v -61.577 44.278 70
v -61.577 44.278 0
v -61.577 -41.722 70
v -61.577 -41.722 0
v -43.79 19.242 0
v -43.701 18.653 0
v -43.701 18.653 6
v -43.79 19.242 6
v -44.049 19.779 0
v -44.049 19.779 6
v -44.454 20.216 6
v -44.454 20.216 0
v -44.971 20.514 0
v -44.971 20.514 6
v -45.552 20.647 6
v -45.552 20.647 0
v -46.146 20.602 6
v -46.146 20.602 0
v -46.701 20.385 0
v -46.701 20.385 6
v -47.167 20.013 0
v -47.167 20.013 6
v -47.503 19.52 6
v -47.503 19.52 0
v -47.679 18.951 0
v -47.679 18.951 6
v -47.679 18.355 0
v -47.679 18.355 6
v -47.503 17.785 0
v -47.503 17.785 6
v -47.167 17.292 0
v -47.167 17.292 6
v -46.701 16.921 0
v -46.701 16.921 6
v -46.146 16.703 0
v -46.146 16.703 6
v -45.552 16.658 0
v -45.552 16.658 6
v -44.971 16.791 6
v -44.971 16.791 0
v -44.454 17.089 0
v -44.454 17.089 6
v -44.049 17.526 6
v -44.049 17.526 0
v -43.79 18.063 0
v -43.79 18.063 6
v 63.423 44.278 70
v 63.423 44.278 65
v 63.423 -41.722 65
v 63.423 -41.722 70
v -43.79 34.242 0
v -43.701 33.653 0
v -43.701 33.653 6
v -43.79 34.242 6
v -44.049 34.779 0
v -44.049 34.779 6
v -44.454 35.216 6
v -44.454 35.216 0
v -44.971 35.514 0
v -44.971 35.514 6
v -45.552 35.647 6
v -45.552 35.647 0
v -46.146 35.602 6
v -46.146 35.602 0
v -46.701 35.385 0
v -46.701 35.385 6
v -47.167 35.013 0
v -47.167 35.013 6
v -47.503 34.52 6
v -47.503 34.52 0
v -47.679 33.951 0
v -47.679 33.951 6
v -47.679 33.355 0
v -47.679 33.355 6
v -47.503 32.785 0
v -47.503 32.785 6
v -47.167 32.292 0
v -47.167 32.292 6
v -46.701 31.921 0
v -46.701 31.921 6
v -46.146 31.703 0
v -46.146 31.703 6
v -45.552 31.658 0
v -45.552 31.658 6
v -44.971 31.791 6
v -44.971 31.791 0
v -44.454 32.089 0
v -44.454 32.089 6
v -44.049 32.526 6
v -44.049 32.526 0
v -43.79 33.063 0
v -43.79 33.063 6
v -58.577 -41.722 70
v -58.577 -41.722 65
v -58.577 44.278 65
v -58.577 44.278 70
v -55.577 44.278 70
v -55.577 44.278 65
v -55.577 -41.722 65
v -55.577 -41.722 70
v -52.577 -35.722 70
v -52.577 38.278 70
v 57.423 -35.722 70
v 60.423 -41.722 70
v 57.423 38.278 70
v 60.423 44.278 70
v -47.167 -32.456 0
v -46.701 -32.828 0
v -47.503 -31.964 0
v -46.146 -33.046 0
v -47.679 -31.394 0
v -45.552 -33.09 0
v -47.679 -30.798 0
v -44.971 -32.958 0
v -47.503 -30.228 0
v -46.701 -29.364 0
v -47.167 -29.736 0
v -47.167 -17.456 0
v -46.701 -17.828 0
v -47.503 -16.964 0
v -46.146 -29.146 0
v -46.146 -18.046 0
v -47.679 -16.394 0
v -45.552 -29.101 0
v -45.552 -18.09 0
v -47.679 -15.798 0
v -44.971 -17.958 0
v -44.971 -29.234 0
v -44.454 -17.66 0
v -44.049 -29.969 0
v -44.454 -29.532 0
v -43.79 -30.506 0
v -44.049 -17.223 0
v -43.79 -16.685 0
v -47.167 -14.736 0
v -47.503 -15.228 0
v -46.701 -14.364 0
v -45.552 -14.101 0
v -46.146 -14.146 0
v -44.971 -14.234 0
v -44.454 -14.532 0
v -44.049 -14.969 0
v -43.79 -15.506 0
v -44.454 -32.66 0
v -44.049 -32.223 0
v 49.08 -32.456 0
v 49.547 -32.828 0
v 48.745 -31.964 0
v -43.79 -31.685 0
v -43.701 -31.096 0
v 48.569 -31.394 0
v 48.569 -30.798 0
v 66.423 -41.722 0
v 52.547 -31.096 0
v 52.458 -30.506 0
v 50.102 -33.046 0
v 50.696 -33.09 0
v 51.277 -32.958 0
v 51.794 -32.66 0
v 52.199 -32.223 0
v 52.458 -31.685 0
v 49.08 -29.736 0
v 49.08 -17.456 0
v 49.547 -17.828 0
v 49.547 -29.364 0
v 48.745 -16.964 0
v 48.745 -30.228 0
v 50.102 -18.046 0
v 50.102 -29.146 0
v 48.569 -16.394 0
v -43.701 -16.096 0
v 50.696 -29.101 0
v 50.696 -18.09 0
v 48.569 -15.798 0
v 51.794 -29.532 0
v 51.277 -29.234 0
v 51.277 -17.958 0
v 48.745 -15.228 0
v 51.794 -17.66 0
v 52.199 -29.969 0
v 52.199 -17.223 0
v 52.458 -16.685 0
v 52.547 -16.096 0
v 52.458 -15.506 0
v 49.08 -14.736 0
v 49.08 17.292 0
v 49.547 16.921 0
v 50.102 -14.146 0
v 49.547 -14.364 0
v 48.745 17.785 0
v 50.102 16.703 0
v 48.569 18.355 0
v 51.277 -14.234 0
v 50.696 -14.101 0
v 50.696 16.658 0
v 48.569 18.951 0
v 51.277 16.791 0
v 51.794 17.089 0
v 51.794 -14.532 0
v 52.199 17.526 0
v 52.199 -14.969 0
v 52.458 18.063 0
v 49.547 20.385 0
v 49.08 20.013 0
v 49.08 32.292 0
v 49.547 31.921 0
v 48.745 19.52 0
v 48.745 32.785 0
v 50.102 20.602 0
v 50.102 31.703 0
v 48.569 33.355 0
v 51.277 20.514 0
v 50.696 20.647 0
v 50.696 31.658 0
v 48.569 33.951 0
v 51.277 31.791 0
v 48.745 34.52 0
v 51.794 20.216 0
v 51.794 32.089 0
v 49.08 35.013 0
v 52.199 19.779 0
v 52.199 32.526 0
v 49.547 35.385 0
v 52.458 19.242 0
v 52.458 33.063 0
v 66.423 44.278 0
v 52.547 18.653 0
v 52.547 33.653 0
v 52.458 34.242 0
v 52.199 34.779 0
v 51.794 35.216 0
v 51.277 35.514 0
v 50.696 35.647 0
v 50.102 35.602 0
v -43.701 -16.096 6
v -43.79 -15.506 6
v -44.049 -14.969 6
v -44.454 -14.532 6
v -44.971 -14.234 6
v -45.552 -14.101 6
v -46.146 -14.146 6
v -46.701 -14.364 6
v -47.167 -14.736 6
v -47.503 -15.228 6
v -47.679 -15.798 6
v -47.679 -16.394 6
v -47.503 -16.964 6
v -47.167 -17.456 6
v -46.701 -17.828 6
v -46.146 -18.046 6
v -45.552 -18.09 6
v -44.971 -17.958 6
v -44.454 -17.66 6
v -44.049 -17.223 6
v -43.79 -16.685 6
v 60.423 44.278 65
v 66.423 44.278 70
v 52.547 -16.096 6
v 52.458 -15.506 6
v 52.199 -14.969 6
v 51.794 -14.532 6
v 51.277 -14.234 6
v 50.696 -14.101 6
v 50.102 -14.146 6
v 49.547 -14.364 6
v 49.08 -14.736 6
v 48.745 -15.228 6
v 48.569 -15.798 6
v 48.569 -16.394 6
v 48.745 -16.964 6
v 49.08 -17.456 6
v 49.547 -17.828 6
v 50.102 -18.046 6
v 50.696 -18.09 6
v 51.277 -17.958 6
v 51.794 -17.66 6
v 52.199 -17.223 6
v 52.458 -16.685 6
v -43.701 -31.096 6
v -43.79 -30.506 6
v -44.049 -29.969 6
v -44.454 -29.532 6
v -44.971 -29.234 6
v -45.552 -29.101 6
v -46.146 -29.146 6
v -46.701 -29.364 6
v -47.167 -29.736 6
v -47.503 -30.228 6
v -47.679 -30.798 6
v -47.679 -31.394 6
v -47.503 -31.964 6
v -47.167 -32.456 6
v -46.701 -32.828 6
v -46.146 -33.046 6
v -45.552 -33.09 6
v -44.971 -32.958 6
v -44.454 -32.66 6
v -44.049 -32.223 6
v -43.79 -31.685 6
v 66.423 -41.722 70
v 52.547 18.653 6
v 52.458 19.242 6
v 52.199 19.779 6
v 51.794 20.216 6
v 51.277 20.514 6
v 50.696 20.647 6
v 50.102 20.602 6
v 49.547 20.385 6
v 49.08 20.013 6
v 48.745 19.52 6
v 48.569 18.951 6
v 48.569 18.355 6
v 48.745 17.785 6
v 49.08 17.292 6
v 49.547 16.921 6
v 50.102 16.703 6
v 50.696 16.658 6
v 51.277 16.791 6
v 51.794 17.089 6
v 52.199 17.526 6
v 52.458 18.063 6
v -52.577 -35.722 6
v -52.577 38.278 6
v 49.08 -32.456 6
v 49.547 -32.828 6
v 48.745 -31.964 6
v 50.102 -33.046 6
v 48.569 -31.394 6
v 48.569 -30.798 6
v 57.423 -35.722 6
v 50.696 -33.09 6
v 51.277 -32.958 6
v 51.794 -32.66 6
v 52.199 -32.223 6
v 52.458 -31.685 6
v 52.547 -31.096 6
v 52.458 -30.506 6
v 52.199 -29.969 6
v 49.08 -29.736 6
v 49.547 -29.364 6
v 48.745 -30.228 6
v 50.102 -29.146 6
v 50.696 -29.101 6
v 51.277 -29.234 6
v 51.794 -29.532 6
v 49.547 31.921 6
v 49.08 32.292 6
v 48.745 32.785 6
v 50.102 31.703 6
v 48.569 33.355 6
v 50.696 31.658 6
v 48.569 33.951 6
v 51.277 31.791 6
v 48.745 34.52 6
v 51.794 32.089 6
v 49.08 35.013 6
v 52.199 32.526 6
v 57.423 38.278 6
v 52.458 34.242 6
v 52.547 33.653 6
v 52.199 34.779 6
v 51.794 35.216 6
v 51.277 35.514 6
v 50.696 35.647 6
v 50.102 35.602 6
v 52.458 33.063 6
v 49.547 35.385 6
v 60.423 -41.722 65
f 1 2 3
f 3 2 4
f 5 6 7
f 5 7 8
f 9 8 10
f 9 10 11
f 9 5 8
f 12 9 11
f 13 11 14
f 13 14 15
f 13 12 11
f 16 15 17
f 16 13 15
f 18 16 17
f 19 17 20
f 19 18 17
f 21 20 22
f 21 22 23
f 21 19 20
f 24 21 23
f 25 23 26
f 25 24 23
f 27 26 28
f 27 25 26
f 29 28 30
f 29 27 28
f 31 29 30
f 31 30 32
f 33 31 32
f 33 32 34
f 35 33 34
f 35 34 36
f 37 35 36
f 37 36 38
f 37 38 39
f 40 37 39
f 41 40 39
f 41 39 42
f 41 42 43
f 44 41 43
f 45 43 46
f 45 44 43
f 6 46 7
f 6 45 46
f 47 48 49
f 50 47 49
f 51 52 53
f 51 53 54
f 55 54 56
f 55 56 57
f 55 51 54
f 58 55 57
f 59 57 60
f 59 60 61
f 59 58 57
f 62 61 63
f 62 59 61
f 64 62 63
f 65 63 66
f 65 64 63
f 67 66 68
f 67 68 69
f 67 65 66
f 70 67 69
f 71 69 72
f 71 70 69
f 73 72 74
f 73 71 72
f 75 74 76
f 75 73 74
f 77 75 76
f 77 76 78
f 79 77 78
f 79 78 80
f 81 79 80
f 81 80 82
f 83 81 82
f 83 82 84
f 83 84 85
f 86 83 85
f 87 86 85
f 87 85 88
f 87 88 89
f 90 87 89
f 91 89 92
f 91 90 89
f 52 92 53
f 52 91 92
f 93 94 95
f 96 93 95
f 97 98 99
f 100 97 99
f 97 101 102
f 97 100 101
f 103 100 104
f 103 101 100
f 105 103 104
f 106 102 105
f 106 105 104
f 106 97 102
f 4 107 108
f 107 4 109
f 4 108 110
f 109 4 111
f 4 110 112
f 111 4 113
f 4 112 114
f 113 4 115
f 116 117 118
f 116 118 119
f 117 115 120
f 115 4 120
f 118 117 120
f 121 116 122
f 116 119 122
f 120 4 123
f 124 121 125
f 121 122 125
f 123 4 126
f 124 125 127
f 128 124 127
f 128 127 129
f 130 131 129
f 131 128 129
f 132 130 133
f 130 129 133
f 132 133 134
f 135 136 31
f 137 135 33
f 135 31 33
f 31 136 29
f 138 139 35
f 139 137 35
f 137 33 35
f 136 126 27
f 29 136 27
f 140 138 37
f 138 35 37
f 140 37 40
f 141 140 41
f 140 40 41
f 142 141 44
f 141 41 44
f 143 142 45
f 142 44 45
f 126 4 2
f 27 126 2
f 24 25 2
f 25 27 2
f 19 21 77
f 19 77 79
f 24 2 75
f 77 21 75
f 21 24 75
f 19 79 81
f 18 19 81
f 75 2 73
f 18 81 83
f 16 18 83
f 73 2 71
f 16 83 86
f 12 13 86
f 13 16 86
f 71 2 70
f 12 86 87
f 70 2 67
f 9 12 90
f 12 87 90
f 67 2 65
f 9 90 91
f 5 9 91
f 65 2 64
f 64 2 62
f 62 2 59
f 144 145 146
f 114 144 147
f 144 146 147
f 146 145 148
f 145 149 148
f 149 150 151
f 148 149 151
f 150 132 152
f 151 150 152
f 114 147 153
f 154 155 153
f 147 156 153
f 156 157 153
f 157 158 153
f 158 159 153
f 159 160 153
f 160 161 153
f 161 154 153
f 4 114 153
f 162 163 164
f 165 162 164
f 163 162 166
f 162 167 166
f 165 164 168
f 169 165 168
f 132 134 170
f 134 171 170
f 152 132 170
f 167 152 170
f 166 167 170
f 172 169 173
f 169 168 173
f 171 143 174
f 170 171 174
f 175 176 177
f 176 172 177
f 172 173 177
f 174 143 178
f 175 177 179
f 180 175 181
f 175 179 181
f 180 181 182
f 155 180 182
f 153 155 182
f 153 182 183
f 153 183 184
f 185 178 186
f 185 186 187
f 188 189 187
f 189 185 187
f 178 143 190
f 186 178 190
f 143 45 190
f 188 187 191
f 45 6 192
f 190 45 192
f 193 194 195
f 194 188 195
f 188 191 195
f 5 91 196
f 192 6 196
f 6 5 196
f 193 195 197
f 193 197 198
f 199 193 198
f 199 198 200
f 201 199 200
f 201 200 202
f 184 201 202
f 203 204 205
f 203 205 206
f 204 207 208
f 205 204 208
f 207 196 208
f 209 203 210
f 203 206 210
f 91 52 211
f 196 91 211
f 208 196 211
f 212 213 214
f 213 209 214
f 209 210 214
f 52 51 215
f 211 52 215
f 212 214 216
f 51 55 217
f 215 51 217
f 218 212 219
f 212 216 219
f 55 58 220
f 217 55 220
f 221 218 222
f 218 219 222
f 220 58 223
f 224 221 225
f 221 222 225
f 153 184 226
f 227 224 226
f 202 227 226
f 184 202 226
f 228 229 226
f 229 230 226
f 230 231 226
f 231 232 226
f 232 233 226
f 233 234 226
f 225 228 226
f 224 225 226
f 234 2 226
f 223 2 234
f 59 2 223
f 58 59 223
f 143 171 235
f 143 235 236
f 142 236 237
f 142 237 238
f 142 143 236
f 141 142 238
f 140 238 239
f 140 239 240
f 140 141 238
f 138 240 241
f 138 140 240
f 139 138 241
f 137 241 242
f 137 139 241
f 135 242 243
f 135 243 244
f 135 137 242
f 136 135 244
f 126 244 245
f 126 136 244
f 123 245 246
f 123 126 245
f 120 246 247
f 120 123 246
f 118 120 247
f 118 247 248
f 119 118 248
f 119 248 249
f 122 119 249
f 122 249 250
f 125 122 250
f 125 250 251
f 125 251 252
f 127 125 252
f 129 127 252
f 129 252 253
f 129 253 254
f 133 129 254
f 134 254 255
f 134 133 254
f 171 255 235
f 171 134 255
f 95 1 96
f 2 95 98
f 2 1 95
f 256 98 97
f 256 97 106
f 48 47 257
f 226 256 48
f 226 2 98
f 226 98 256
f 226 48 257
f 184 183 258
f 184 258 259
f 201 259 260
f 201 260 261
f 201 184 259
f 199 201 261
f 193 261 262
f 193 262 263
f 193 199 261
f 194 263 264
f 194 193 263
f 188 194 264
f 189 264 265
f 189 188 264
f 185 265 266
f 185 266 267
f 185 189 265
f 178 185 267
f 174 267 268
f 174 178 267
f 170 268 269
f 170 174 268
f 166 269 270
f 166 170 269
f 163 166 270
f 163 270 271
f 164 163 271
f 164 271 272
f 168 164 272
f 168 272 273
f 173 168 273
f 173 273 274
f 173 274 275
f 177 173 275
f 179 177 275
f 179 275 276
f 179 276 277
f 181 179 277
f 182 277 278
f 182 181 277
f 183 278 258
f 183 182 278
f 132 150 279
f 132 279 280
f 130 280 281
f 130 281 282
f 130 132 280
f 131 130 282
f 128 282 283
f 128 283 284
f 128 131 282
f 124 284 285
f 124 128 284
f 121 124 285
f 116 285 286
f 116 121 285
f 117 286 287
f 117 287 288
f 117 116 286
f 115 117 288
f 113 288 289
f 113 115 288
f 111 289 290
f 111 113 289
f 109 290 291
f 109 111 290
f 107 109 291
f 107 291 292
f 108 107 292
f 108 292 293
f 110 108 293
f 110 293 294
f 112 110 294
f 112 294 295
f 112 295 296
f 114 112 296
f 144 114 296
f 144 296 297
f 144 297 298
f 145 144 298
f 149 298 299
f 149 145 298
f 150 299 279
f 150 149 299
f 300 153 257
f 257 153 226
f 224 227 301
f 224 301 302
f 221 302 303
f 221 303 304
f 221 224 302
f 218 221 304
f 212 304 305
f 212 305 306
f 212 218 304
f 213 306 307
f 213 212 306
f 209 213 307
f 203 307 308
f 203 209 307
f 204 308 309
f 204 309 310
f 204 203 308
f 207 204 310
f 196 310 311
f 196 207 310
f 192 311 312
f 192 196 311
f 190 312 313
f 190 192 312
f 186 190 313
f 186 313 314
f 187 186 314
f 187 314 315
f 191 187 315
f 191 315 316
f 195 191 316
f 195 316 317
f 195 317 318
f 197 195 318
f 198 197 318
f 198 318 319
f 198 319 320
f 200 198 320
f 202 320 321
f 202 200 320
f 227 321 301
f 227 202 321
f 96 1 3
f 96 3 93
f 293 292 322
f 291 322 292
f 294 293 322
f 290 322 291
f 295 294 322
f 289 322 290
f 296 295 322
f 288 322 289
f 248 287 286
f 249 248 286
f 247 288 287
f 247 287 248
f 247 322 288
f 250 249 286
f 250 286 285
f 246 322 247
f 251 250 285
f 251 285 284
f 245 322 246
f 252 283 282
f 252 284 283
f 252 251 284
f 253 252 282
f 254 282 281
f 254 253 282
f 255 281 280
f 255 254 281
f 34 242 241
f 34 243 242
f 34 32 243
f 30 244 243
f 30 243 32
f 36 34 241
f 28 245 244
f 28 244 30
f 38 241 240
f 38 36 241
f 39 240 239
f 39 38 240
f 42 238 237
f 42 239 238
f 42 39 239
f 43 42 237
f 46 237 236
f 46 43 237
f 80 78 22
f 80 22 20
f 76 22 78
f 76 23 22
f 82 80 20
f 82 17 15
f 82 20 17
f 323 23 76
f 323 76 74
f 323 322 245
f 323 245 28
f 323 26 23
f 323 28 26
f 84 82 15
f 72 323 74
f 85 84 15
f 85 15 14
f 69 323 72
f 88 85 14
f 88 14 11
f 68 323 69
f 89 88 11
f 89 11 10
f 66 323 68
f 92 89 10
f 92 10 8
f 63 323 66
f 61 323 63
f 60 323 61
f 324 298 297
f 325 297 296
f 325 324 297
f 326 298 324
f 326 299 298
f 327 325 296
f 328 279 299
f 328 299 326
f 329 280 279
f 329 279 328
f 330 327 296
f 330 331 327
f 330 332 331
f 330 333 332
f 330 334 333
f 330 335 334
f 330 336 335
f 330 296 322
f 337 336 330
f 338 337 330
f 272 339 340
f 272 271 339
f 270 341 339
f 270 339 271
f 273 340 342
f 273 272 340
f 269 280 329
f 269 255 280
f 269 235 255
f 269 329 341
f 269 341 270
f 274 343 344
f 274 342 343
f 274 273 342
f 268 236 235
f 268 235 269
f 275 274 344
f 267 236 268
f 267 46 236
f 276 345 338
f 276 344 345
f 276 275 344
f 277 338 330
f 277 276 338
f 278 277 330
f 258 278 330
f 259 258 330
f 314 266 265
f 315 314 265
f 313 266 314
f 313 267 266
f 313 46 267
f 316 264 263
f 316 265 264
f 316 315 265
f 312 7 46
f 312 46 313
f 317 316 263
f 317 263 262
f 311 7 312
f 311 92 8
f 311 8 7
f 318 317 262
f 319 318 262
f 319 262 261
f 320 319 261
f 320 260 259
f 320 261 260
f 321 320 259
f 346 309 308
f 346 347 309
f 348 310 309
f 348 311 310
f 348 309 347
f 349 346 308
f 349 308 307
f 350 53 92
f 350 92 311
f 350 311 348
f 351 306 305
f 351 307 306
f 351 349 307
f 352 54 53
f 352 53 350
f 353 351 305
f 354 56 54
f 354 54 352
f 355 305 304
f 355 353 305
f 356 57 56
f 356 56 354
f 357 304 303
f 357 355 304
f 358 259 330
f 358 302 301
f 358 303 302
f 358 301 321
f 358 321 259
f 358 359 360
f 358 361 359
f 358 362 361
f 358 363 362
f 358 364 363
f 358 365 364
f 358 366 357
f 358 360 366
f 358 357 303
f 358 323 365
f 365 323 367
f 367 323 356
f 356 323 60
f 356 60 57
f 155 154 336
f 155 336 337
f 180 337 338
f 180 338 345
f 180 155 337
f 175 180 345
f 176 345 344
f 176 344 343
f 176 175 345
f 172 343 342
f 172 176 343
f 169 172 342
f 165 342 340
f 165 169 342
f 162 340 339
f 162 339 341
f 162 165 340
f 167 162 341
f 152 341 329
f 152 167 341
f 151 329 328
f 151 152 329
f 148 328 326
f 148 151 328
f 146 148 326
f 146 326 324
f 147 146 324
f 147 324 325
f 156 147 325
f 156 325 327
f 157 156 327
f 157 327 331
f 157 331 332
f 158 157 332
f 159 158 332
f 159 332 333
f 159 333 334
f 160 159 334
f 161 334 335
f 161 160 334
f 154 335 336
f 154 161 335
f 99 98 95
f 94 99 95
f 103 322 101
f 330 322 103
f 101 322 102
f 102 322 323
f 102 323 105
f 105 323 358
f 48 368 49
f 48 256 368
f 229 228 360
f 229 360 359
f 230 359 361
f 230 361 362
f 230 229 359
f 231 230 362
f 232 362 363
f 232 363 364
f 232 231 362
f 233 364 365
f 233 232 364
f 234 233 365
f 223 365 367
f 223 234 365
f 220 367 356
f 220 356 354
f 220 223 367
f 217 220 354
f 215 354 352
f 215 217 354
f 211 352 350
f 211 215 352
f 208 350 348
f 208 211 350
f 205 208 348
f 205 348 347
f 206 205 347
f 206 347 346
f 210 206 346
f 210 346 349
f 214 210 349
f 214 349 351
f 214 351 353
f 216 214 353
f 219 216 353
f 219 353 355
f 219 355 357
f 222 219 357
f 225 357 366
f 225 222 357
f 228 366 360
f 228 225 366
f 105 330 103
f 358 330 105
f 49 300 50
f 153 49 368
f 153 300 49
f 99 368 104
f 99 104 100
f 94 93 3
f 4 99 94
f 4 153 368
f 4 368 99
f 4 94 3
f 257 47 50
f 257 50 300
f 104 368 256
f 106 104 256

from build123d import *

# Parameters (mm, degrees)
SKETCH_1_W         = 3
SKETCH_1_H         = 86
EXTRUDE_10_DEPTH   = 70
SKETCH_1_W_2       = 116
SKETCH_1_W_3       = 110
SKETCH_1_H_2       = 74
EXTRUDE_10_2_DEPTH = 70
EXTRUDE_10_3_DEPTH = 70
EXTRUDE_11_DEPTH   = 65
SKETCH_1_12_W      = 110
SKETCH_1_12_H      = 74
SKETCH_1_12_R      = 2
EXTRUDE_12_DEPTH   = 6


with BuildPart() as part:
    # Эскиз1 → Бобышка-Вытянуть10 (new body)
    with BuildSketch(Plane.XY):
        with Locations((-60.077319588, 1.278350515)):
            Rectangle(SKETCH_1_W, SKETCH_1_H)
    extrude(amount=EXTRUDE_10_DEPTH)



with BuildPart() as body_2:
    # Эскиз1 → Extrude 10 2 (new body)
    with BuildSketch(Plane.XY):
        with Locations((2.422680412, 1.278350515)):
            Rectangle(SKETCH_1_W_2, SKETCH_1_H)
        with Locations((2.422680412, 1.278350515)):
            Rectangle(SKETCH_1_W_3, SKETCH_1_H_2, mode=Mode.SUBTRACT)
    extrude(amount=EXTRUDE_10_2_DEPTH)


with BuildPart() as body_3:
    # Эскиз1 → Extrude 10 3 (new body)
    with BuildSketch(Plane.XY):
        with Locations((64.922680412, 1.278350515)):
            Rectangle(SKETCH_1_W, SKETCH_1_H)
    extrude(amount=EXTRUDE_10_3_DEPTH)


with BuildPart() as part_1:
    add(part.part)

    add(body_2.part)  # Бобышка-Вытянуть11 merges body 2

    add(body_3.part)  # Бобышка-Вытянуть11 merges body 3
    # Эскиз1<11> → Бобышка-Вытянуть11 (add)
    with BuildSketch(Plane.XY):
        Polygon((-58.577319588, 38.278350515), (-58.577319588, 44.278350515), (-55.577319588, 44.278350515), (-55.577319588, 38.278350515), (-55.577319588, -35.721649485), (-55.577319588, -41.721649485), (-58.577319588, -41.721649485), (-58.577319588, -35.721649485), align=None)
        Polygon((60.422680412, -35.721649485), (60.422680412, -41.721649485), (63.422680412, -41.721649485), (63.422680412, -35.721649485), (63.422680412, 38.278350515), (63.422680412, 44.278350515), (60.422680412, 44.278350515), (60.422680412, 38.278350515), align=None)
    extrude(amount=EXTRUDE_11_DEPTH)

    # Эскиз1<12> → Бобышка-Вытянуть12 (add)
    with BuildSketch(Plane.XY):
        with Locations((2.422680412, 1.278350515)):
            Rectangle(SKETCH_1_12_W, SKETCH_1_12_H)
        with Locations((50.546562804, 33.65259867)):
            Circle(SKETCH_1_12_R, mode=Mode.SUBTRACT)
        with Locations((-45.701201979, 33.65259867)):
            Circle(SKETCH_1_12_R, mode=Mode.SUBTRACT)
        with Locations((50.546562804, -31.095897639)):
            Circle(SKETCH_1_12_R, mode=Mode.SUBTRACT)
        with Locations((50.546562804, -16.095897639)):
            Circle(SKETCH_1_12_R, mode=Mode.SUBTRACT)
        with Locations((50.546562804, 18.65259867)):
            Circle(SKETCH_1_12_R, mode=Mode.SUBTRACT)
        with Locations((-45.701201979, -16.095897639)):
            Circle(SKETCH_1_12_R, mode=Mode.SUBTRACT)
        with Locations((-45.701201979, 18.65259867)):
            Circle(SKETCH_1_12_R, mode=Mode.SUBTRACT)
        with Locations((-45.701201979, -31.095897639)):
            Circle(SKETCH_1_12_R, mode=Mode.SUBTRACT)
    extrude(amount=EXTRUDE_12_DEPTH)


solid = part_1.part
